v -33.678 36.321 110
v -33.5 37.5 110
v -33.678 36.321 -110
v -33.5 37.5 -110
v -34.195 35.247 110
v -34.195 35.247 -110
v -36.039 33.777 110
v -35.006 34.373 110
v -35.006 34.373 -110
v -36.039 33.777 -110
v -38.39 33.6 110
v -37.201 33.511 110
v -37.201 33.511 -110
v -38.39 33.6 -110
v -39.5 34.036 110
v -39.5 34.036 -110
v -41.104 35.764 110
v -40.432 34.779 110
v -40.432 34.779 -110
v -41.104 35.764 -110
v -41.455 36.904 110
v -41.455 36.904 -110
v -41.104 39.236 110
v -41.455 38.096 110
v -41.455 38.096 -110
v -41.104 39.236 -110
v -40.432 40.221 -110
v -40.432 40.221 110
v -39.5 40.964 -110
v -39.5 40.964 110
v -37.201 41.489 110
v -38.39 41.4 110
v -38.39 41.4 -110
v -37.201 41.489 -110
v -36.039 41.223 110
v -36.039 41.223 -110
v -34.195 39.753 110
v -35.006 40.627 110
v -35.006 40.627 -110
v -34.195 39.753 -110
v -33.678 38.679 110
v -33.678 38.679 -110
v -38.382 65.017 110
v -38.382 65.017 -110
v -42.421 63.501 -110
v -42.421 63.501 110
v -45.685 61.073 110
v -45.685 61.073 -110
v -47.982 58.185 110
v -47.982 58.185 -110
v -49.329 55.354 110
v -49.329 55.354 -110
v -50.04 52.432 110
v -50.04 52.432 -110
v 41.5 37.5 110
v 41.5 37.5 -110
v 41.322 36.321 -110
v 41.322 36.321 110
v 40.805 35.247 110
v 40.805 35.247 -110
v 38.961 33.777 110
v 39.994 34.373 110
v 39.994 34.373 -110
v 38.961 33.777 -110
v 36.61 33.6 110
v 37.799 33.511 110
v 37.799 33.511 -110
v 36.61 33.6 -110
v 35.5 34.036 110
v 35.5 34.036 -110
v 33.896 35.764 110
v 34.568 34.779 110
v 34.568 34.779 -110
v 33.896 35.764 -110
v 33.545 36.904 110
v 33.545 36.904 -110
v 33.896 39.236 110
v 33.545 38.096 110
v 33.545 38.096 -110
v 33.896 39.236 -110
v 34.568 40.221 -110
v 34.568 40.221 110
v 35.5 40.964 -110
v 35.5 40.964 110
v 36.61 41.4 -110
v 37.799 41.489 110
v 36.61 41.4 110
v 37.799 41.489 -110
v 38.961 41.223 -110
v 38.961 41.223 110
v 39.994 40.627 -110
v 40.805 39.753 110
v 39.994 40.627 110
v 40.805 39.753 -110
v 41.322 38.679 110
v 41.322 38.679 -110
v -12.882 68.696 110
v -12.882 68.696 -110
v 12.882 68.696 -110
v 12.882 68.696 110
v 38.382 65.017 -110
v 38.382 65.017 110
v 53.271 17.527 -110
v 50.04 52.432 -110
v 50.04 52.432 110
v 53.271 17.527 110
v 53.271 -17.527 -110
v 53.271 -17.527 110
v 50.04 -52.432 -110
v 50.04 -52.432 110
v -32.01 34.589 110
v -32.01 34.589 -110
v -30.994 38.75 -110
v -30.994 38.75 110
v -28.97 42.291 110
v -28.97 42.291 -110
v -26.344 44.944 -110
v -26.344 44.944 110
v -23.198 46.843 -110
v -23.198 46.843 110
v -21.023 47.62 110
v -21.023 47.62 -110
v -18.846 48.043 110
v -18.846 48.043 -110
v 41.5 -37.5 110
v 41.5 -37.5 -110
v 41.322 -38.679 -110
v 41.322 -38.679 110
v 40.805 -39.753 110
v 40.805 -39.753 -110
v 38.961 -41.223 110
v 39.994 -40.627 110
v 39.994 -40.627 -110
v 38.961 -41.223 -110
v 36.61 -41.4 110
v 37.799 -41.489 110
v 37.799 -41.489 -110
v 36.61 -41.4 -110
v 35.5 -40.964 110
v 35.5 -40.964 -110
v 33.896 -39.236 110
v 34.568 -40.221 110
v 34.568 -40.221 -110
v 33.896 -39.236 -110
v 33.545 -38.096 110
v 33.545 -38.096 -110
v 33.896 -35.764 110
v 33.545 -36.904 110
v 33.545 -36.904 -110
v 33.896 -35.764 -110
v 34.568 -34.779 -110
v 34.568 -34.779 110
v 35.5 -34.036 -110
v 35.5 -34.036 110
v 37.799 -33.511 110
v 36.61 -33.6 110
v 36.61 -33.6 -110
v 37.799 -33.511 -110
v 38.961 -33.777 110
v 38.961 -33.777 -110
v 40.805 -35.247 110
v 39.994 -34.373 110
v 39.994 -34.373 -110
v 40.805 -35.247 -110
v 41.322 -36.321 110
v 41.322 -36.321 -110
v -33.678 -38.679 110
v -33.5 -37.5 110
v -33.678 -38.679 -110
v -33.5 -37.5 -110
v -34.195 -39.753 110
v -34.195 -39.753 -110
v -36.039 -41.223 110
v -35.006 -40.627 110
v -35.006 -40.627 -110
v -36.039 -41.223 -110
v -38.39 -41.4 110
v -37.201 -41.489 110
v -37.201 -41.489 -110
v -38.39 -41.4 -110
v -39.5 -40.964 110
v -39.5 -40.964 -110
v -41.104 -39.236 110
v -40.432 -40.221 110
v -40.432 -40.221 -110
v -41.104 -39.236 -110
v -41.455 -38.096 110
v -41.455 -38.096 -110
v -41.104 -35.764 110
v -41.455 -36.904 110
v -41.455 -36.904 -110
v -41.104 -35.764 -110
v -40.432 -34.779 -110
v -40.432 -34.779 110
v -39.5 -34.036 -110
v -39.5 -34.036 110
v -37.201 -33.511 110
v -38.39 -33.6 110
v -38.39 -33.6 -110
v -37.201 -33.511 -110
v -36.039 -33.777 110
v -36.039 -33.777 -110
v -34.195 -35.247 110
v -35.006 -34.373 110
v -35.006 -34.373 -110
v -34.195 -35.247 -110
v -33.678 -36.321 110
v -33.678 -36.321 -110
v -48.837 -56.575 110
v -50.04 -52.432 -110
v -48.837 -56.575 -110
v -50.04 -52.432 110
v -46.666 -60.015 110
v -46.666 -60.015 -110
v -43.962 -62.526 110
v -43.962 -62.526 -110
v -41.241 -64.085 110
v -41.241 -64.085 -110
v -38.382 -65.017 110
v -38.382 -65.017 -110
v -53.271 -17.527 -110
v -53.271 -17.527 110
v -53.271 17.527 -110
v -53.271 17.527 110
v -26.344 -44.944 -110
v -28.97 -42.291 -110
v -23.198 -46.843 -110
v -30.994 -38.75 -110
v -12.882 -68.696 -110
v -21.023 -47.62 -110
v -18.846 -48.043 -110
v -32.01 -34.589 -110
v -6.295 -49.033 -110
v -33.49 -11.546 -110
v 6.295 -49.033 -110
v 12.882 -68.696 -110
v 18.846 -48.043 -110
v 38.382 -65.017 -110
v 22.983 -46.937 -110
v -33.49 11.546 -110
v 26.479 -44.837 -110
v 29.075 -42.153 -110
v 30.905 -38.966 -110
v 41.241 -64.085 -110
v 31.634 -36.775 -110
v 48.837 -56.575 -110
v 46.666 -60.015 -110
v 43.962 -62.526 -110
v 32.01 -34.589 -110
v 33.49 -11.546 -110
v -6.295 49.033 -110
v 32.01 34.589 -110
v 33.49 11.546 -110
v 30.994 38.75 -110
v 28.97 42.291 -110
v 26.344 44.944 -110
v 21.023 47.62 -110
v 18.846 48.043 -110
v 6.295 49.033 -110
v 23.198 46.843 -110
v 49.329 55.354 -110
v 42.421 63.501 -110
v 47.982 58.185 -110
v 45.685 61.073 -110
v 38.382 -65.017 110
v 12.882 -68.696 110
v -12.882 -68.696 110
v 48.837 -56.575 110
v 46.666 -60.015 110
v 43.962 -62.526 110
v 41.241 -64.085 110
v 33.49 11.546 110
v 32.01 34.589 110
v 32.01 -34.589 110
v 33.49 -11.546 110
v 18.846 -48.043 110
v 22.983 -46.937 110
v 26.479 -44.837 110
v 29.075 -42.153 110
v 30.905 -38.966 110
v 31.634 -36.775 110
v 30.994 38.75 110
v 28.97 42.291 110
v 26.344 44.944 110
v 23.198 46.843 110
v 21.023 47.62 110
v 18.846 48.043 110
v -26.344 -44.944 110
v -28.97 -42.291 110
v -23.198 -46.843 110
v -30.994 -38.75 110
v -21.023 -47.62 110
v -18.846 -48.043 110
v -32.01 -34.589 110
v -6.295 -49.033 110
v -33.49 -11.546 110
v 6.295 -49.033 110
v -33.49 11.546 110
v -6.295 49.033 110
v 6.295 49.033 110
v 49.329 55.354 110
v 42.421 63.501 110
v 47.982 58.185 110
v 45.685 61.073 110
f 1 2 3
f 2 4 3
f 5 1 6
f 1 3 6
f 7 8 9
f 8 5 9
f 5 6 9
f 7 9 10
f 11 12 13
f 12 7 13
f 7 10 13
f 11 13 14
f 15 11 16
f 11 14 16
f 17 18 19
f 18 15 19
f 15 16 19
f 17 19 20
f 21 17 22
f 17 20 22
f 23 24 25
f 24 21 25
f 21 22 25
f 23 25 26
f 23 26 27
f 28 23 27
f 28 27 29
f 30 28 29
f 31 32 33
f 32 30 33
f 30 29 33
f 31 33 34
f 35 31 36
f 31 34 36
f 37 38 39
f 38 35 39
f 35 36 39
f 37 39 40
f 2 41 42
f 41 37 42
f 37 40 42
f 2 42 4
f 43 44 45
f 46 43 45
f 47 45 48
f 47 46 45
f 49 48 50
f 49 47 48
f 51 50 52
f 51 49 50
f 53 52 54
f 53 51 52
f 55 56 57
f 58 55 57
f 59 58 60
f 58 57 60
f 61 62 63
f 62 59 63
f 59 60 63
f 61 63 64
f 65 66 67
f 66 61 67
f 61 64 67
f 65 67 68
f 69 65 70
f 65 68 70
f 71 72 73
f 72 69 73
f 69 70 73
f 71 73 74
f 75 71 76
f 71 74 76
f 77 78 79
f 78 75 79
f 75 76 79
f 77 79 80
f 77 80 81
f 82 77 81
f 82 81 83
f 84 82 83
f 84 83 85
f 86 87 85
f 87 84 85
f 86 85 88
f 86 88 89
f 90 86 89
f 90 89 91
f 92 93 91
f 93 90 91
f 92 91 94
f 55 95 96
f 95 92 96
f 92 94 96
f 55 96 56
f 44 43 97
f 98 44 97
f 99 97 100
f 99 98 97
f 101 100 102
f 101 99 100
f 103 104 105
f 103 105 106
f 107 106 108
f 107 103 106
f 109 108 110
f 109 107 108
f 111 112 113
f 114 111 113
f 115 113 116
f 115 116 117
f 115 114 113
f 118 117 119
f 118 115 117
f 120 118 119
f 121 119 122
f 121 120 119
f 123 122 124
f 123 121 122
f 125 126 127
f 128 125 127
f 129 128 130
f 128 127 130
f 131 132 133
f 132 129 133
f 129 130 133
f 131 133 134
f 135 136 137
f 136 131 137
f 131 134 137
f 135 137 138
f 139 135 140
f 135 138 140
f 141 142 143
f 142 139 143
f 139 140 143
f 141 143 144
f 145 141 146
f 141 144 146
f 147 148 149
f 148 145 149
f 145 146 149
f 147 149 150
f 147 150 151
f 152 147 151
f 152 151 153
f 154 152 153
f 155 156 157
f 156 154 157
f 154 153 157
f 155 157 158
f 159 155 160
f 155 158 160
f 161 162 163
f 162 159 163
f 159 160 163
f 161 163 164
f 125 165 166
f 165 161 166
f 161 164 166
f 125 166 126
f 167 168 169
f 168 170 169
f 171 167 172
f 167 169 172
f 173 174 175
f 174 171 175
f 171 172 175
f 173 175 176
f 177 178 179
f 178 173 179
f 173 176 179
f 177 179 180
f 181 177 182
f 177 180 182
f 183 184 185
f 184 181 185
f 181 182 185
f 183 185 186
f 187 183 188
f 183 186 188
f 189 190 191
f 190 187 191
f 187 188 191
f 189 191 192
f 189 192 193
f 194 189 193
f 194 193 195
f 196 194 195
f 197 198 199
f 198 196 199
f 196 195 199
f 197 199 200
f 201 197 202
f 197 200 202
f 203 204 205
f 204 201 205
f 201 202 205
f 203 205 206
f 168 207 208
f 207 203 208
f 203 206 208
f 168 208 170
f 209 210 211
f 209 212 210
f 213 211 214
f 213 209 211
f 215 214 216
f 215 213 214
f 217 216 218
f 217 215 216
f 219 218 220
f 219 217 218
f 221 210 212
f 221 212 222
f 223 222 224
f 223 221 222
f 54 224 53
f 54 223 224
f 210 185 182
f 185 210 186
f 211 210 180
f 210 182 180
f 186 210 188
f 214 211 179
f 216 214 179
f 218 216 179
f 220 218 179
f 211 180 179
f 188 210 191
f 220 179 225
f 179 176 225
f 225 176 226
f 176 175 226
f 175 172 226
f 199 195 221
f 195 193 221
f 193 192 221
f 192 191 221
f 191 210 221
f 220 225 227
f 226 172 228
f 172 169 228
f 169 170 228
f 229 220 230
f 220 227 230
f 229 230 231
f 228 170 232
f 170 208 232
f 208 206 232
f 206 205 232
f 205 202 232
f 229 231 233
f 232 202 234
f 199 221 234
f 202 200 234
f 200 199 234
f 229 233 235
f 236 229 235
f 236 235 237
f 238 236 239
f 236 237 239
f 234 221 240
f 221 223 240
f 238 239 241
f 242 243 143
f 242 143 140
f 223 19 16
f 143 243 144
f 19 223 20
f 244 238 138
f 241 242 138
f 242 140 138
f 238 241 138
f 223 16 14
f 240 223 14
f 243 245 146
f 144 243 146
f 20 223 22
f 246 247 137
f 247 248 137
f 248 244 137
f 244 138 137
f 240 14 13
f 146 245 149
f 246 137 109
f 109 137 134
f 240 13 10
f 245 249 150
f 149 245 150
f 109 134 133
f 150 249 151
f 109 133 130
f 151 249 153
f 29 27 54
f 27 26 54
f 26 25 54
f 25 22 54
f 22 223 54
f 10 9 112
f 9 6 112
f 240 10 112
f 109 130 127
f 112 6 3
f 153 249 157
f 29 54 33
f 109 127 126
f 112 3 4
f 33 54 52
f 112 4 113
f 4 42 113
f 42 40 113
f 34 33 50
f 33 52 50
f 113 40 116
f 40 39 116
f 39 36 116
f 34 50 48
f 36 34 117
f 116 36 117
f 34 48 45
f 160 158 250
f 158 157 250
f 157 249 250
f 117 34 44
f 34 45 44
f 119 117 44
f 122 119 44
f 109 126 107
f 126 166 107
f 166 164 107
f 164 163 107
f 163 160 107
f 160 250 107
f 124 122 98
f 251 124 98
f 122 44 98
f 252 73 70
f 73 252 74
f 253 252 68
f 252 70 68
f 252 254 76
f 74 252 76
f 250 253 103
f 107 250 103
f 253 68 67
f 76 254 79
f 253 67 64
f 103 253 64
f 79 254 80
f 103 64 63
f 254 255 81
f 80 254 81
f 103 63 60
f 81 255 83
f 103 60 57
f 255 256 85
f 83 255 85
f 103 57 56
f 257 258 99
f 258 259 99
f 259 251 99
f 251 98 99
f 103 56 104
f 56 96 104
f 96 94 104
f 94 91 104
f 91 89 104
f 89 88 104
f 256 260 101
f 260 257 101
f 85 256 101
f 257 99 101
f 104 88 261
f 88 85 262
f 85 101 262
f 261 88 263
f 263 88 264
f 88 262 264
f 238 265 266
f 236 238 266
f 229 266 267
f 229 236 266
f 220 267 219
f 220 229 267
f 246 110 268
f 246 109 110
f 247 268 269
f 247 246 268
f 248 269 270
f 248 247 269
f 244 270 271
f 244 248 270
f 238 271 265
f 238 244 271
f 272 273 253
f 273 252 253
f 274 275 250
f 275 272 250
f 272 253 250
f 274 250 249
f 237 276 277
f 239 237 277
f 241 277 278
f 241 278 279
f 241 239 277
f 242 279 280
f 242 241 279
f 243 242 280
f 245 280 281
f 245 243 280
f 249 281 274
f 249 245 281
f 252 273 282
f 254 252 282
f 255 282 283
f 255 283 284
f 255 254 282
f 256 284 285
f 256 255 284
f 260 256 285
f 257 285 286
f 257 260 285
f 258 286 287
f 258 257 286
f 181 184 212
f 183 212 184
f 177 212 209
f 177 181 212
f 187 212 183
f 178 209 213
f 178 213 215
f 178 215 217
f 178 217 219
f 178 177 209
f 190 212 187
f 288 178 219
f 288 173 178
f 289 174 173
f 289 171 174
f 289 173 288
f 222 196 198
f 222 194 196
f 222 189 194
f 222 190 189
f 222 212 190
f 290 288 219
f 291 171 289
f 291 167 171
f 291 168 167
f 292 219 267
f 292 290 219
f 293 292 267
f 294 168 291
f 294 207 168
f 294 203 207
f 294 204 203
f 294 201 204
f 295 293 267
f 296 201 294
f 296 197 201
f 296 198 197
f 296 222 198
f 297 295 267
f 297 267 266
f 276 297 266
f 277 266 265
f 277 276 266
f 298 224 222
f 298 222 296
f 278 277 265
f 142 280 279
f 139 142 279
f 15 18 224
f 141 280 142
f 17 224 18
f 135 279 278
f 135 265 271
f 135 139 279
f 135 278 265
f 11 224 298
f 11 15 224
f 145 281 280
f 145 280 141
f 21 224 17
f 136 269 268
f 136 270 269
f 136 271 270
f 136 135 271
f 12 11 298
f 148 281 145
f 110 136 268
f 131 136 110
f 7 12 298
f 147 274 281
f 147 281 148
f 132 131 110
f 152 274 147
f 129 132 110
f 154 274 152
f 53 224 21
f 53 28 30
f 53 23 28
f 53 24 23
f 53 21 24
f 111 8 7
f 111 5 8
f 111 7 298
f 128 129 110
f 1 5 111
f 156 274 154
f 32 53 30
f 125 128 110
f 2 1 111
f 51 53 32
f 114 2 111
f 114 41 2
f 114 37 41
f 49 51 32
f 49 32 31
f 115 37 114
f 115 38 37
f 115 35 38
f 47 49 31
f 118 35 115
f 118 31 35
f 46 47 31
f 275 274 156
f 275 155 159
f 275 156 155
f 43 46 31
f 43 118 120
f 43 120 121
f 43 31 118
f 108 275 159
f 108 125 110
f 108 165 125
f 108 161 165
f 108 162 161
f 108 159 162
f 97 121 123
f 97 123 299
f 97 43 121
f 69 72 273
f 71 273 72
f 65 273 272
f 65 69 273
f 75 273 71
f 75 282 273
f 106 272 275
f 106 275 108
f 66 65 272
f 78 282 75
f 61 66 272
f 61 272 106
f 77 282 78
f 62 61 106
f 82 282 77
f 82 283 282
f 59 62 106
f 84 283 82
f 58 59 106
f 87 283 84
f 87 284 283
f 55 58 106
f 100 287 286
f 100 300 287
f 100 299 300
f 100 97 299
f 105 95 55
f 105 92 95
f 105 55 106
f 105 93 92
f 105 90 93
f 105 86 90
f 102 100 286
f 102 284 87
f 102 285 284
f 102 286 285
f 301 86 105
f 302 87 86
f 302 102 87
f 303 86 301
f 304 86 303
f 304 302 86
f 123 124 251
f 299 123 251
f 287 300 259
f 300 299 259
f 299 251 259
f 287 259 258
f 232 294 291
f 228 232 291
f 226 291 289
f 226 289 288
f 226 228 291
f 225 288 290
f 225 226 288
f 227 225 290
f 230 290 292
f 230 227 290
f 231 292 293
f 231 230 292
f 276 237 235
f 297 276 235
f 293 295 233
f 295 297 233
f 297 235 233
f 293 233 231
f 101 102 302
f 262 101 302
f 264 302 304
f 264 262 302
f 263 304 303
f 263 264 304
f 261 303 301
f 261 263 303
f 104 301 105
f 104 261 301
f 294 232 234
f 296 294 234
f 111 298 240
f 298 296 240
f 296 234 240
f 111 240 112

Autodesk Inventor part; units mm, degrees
ref_plane "YZ Plane" through (0, 0, 0) normal (1, 0, 0) x (0, 1, 0)
ref_plane "XZ Plane" through (0, 0, 0) normal (0, 1, 0) x (-1, 0, 0)
ref_plane "XY Plane" through (0, 0, 0) normal (0, 0, 1) x (1, 0, 0)
sketch "Sketch1" plane through (0, 0, 0) normal (0, 0, 1) x (1, 0, 0)
  circle A0 centre (-57, 57.5) radius 3
  circle A1 centre (57, 57.5) radius 3
  circle A2 centre (-57, -57.5) radius 3
  circle A3 centre (57, -57.5) radius 3
  line L0 (-57, -57.5) -> (57, 57.5) construction
  line L1 (-67.5, 67.5) -> (67.5, 67.5) construction
  line L2 (67.5, 67.5) -> (67.5, -67.5) construction
  line L3 (67.5, -67.5) -> (-67.5, -67.5) construction
  line L4 (-67.5, -67.5) -> (-67.5, 67.5) construction
  line L5 (-67.5, 67.5) -> (67.5, -67.5) construction
  line L6 (67.5, 67.5) -> (-67.5, -67.5) construction
  circle A4 centre (-37.5, 37.5) radius 4
  circle A5 centre (-37.5, -37.5) radius 4
  circle A6 centre (37.5, -37.5) radius 4
  circle A7 centre (37.5, 37.5) radius 4
  arc A8 (-48.5, 62.5) -> (-48.5, -62.5) centre (326.325, 0) ccw
  line L7 (0, 67.5) -> (0, -67.5) construction
  line L8 (67.5, -67.5) -> (67.5, 67.5) construction
  arc A9 (48.5, -62.5) -> (48.5, 62.5) centre (-326.325, 0) ccw
  arc A10 (48.5, 62.5) -> (-48.5, 62.5) centre (0, -110.8429) ccw
  line L9 (-67.5, 0) -> (53.675, 0) construction
  arc A11 (-48.5, -62.5) -> (48.5, -62.5) centre (0, 110.8429) ccw
  arc A12 (-30.7003, 46.1842) -> (-30.7003, -46.1842) centre (326.325, 0) ccw
  arc A13 (-30.7003, -46.1842) -> (30.7003, -46.1842) centre (0, 110.8429) ccw
  arc A14 (30.7003, -46.1842) -> (30.7003, 46.1842) centre (-326.325, 0) ccw
  arc A15 (30.7003, 46.1842) -> (-30.7003, 46.1842) centre (0, -110.8429) ccw
  point P0 (0, 0)
  point P1 (0, 0)
  point P2 (-53.675, 0)
  point P3 (0, 0)
  dimension "d0" = 114
  dimension "d1" = 115
  dimension "d2" = 6
  dimension "d3" = 135
  dimension "d4" = 135
  dimension "d5" = 8
  dimension "d9" = 360
  dimension "d29" = 75
  dimension "d30" = 125
  dimension "d31" = 97
  dimension "d32" = 180
  dimension "d33" = 380
  dimension "d34" = 20
extrude "Extrusion1" add sketch "Sketch1" along normal mid plane 220 contours A10 A9 A11 A8
fillet "Fillet2" radius 15 8 edges at (48.5, 62.5, 0) (-48.5, 62.5, 0) (-48.5, -62.5, 0) (48.5, -62.5, 0) (-30.7003, 46.1842, 0) (30.7003, 46.1842, 0) (30.7003, -46.1842, 0) (-30.7003, -46.1842, 0)
properties part number "lineaire as deel 1" material "Aluminum 6061"
